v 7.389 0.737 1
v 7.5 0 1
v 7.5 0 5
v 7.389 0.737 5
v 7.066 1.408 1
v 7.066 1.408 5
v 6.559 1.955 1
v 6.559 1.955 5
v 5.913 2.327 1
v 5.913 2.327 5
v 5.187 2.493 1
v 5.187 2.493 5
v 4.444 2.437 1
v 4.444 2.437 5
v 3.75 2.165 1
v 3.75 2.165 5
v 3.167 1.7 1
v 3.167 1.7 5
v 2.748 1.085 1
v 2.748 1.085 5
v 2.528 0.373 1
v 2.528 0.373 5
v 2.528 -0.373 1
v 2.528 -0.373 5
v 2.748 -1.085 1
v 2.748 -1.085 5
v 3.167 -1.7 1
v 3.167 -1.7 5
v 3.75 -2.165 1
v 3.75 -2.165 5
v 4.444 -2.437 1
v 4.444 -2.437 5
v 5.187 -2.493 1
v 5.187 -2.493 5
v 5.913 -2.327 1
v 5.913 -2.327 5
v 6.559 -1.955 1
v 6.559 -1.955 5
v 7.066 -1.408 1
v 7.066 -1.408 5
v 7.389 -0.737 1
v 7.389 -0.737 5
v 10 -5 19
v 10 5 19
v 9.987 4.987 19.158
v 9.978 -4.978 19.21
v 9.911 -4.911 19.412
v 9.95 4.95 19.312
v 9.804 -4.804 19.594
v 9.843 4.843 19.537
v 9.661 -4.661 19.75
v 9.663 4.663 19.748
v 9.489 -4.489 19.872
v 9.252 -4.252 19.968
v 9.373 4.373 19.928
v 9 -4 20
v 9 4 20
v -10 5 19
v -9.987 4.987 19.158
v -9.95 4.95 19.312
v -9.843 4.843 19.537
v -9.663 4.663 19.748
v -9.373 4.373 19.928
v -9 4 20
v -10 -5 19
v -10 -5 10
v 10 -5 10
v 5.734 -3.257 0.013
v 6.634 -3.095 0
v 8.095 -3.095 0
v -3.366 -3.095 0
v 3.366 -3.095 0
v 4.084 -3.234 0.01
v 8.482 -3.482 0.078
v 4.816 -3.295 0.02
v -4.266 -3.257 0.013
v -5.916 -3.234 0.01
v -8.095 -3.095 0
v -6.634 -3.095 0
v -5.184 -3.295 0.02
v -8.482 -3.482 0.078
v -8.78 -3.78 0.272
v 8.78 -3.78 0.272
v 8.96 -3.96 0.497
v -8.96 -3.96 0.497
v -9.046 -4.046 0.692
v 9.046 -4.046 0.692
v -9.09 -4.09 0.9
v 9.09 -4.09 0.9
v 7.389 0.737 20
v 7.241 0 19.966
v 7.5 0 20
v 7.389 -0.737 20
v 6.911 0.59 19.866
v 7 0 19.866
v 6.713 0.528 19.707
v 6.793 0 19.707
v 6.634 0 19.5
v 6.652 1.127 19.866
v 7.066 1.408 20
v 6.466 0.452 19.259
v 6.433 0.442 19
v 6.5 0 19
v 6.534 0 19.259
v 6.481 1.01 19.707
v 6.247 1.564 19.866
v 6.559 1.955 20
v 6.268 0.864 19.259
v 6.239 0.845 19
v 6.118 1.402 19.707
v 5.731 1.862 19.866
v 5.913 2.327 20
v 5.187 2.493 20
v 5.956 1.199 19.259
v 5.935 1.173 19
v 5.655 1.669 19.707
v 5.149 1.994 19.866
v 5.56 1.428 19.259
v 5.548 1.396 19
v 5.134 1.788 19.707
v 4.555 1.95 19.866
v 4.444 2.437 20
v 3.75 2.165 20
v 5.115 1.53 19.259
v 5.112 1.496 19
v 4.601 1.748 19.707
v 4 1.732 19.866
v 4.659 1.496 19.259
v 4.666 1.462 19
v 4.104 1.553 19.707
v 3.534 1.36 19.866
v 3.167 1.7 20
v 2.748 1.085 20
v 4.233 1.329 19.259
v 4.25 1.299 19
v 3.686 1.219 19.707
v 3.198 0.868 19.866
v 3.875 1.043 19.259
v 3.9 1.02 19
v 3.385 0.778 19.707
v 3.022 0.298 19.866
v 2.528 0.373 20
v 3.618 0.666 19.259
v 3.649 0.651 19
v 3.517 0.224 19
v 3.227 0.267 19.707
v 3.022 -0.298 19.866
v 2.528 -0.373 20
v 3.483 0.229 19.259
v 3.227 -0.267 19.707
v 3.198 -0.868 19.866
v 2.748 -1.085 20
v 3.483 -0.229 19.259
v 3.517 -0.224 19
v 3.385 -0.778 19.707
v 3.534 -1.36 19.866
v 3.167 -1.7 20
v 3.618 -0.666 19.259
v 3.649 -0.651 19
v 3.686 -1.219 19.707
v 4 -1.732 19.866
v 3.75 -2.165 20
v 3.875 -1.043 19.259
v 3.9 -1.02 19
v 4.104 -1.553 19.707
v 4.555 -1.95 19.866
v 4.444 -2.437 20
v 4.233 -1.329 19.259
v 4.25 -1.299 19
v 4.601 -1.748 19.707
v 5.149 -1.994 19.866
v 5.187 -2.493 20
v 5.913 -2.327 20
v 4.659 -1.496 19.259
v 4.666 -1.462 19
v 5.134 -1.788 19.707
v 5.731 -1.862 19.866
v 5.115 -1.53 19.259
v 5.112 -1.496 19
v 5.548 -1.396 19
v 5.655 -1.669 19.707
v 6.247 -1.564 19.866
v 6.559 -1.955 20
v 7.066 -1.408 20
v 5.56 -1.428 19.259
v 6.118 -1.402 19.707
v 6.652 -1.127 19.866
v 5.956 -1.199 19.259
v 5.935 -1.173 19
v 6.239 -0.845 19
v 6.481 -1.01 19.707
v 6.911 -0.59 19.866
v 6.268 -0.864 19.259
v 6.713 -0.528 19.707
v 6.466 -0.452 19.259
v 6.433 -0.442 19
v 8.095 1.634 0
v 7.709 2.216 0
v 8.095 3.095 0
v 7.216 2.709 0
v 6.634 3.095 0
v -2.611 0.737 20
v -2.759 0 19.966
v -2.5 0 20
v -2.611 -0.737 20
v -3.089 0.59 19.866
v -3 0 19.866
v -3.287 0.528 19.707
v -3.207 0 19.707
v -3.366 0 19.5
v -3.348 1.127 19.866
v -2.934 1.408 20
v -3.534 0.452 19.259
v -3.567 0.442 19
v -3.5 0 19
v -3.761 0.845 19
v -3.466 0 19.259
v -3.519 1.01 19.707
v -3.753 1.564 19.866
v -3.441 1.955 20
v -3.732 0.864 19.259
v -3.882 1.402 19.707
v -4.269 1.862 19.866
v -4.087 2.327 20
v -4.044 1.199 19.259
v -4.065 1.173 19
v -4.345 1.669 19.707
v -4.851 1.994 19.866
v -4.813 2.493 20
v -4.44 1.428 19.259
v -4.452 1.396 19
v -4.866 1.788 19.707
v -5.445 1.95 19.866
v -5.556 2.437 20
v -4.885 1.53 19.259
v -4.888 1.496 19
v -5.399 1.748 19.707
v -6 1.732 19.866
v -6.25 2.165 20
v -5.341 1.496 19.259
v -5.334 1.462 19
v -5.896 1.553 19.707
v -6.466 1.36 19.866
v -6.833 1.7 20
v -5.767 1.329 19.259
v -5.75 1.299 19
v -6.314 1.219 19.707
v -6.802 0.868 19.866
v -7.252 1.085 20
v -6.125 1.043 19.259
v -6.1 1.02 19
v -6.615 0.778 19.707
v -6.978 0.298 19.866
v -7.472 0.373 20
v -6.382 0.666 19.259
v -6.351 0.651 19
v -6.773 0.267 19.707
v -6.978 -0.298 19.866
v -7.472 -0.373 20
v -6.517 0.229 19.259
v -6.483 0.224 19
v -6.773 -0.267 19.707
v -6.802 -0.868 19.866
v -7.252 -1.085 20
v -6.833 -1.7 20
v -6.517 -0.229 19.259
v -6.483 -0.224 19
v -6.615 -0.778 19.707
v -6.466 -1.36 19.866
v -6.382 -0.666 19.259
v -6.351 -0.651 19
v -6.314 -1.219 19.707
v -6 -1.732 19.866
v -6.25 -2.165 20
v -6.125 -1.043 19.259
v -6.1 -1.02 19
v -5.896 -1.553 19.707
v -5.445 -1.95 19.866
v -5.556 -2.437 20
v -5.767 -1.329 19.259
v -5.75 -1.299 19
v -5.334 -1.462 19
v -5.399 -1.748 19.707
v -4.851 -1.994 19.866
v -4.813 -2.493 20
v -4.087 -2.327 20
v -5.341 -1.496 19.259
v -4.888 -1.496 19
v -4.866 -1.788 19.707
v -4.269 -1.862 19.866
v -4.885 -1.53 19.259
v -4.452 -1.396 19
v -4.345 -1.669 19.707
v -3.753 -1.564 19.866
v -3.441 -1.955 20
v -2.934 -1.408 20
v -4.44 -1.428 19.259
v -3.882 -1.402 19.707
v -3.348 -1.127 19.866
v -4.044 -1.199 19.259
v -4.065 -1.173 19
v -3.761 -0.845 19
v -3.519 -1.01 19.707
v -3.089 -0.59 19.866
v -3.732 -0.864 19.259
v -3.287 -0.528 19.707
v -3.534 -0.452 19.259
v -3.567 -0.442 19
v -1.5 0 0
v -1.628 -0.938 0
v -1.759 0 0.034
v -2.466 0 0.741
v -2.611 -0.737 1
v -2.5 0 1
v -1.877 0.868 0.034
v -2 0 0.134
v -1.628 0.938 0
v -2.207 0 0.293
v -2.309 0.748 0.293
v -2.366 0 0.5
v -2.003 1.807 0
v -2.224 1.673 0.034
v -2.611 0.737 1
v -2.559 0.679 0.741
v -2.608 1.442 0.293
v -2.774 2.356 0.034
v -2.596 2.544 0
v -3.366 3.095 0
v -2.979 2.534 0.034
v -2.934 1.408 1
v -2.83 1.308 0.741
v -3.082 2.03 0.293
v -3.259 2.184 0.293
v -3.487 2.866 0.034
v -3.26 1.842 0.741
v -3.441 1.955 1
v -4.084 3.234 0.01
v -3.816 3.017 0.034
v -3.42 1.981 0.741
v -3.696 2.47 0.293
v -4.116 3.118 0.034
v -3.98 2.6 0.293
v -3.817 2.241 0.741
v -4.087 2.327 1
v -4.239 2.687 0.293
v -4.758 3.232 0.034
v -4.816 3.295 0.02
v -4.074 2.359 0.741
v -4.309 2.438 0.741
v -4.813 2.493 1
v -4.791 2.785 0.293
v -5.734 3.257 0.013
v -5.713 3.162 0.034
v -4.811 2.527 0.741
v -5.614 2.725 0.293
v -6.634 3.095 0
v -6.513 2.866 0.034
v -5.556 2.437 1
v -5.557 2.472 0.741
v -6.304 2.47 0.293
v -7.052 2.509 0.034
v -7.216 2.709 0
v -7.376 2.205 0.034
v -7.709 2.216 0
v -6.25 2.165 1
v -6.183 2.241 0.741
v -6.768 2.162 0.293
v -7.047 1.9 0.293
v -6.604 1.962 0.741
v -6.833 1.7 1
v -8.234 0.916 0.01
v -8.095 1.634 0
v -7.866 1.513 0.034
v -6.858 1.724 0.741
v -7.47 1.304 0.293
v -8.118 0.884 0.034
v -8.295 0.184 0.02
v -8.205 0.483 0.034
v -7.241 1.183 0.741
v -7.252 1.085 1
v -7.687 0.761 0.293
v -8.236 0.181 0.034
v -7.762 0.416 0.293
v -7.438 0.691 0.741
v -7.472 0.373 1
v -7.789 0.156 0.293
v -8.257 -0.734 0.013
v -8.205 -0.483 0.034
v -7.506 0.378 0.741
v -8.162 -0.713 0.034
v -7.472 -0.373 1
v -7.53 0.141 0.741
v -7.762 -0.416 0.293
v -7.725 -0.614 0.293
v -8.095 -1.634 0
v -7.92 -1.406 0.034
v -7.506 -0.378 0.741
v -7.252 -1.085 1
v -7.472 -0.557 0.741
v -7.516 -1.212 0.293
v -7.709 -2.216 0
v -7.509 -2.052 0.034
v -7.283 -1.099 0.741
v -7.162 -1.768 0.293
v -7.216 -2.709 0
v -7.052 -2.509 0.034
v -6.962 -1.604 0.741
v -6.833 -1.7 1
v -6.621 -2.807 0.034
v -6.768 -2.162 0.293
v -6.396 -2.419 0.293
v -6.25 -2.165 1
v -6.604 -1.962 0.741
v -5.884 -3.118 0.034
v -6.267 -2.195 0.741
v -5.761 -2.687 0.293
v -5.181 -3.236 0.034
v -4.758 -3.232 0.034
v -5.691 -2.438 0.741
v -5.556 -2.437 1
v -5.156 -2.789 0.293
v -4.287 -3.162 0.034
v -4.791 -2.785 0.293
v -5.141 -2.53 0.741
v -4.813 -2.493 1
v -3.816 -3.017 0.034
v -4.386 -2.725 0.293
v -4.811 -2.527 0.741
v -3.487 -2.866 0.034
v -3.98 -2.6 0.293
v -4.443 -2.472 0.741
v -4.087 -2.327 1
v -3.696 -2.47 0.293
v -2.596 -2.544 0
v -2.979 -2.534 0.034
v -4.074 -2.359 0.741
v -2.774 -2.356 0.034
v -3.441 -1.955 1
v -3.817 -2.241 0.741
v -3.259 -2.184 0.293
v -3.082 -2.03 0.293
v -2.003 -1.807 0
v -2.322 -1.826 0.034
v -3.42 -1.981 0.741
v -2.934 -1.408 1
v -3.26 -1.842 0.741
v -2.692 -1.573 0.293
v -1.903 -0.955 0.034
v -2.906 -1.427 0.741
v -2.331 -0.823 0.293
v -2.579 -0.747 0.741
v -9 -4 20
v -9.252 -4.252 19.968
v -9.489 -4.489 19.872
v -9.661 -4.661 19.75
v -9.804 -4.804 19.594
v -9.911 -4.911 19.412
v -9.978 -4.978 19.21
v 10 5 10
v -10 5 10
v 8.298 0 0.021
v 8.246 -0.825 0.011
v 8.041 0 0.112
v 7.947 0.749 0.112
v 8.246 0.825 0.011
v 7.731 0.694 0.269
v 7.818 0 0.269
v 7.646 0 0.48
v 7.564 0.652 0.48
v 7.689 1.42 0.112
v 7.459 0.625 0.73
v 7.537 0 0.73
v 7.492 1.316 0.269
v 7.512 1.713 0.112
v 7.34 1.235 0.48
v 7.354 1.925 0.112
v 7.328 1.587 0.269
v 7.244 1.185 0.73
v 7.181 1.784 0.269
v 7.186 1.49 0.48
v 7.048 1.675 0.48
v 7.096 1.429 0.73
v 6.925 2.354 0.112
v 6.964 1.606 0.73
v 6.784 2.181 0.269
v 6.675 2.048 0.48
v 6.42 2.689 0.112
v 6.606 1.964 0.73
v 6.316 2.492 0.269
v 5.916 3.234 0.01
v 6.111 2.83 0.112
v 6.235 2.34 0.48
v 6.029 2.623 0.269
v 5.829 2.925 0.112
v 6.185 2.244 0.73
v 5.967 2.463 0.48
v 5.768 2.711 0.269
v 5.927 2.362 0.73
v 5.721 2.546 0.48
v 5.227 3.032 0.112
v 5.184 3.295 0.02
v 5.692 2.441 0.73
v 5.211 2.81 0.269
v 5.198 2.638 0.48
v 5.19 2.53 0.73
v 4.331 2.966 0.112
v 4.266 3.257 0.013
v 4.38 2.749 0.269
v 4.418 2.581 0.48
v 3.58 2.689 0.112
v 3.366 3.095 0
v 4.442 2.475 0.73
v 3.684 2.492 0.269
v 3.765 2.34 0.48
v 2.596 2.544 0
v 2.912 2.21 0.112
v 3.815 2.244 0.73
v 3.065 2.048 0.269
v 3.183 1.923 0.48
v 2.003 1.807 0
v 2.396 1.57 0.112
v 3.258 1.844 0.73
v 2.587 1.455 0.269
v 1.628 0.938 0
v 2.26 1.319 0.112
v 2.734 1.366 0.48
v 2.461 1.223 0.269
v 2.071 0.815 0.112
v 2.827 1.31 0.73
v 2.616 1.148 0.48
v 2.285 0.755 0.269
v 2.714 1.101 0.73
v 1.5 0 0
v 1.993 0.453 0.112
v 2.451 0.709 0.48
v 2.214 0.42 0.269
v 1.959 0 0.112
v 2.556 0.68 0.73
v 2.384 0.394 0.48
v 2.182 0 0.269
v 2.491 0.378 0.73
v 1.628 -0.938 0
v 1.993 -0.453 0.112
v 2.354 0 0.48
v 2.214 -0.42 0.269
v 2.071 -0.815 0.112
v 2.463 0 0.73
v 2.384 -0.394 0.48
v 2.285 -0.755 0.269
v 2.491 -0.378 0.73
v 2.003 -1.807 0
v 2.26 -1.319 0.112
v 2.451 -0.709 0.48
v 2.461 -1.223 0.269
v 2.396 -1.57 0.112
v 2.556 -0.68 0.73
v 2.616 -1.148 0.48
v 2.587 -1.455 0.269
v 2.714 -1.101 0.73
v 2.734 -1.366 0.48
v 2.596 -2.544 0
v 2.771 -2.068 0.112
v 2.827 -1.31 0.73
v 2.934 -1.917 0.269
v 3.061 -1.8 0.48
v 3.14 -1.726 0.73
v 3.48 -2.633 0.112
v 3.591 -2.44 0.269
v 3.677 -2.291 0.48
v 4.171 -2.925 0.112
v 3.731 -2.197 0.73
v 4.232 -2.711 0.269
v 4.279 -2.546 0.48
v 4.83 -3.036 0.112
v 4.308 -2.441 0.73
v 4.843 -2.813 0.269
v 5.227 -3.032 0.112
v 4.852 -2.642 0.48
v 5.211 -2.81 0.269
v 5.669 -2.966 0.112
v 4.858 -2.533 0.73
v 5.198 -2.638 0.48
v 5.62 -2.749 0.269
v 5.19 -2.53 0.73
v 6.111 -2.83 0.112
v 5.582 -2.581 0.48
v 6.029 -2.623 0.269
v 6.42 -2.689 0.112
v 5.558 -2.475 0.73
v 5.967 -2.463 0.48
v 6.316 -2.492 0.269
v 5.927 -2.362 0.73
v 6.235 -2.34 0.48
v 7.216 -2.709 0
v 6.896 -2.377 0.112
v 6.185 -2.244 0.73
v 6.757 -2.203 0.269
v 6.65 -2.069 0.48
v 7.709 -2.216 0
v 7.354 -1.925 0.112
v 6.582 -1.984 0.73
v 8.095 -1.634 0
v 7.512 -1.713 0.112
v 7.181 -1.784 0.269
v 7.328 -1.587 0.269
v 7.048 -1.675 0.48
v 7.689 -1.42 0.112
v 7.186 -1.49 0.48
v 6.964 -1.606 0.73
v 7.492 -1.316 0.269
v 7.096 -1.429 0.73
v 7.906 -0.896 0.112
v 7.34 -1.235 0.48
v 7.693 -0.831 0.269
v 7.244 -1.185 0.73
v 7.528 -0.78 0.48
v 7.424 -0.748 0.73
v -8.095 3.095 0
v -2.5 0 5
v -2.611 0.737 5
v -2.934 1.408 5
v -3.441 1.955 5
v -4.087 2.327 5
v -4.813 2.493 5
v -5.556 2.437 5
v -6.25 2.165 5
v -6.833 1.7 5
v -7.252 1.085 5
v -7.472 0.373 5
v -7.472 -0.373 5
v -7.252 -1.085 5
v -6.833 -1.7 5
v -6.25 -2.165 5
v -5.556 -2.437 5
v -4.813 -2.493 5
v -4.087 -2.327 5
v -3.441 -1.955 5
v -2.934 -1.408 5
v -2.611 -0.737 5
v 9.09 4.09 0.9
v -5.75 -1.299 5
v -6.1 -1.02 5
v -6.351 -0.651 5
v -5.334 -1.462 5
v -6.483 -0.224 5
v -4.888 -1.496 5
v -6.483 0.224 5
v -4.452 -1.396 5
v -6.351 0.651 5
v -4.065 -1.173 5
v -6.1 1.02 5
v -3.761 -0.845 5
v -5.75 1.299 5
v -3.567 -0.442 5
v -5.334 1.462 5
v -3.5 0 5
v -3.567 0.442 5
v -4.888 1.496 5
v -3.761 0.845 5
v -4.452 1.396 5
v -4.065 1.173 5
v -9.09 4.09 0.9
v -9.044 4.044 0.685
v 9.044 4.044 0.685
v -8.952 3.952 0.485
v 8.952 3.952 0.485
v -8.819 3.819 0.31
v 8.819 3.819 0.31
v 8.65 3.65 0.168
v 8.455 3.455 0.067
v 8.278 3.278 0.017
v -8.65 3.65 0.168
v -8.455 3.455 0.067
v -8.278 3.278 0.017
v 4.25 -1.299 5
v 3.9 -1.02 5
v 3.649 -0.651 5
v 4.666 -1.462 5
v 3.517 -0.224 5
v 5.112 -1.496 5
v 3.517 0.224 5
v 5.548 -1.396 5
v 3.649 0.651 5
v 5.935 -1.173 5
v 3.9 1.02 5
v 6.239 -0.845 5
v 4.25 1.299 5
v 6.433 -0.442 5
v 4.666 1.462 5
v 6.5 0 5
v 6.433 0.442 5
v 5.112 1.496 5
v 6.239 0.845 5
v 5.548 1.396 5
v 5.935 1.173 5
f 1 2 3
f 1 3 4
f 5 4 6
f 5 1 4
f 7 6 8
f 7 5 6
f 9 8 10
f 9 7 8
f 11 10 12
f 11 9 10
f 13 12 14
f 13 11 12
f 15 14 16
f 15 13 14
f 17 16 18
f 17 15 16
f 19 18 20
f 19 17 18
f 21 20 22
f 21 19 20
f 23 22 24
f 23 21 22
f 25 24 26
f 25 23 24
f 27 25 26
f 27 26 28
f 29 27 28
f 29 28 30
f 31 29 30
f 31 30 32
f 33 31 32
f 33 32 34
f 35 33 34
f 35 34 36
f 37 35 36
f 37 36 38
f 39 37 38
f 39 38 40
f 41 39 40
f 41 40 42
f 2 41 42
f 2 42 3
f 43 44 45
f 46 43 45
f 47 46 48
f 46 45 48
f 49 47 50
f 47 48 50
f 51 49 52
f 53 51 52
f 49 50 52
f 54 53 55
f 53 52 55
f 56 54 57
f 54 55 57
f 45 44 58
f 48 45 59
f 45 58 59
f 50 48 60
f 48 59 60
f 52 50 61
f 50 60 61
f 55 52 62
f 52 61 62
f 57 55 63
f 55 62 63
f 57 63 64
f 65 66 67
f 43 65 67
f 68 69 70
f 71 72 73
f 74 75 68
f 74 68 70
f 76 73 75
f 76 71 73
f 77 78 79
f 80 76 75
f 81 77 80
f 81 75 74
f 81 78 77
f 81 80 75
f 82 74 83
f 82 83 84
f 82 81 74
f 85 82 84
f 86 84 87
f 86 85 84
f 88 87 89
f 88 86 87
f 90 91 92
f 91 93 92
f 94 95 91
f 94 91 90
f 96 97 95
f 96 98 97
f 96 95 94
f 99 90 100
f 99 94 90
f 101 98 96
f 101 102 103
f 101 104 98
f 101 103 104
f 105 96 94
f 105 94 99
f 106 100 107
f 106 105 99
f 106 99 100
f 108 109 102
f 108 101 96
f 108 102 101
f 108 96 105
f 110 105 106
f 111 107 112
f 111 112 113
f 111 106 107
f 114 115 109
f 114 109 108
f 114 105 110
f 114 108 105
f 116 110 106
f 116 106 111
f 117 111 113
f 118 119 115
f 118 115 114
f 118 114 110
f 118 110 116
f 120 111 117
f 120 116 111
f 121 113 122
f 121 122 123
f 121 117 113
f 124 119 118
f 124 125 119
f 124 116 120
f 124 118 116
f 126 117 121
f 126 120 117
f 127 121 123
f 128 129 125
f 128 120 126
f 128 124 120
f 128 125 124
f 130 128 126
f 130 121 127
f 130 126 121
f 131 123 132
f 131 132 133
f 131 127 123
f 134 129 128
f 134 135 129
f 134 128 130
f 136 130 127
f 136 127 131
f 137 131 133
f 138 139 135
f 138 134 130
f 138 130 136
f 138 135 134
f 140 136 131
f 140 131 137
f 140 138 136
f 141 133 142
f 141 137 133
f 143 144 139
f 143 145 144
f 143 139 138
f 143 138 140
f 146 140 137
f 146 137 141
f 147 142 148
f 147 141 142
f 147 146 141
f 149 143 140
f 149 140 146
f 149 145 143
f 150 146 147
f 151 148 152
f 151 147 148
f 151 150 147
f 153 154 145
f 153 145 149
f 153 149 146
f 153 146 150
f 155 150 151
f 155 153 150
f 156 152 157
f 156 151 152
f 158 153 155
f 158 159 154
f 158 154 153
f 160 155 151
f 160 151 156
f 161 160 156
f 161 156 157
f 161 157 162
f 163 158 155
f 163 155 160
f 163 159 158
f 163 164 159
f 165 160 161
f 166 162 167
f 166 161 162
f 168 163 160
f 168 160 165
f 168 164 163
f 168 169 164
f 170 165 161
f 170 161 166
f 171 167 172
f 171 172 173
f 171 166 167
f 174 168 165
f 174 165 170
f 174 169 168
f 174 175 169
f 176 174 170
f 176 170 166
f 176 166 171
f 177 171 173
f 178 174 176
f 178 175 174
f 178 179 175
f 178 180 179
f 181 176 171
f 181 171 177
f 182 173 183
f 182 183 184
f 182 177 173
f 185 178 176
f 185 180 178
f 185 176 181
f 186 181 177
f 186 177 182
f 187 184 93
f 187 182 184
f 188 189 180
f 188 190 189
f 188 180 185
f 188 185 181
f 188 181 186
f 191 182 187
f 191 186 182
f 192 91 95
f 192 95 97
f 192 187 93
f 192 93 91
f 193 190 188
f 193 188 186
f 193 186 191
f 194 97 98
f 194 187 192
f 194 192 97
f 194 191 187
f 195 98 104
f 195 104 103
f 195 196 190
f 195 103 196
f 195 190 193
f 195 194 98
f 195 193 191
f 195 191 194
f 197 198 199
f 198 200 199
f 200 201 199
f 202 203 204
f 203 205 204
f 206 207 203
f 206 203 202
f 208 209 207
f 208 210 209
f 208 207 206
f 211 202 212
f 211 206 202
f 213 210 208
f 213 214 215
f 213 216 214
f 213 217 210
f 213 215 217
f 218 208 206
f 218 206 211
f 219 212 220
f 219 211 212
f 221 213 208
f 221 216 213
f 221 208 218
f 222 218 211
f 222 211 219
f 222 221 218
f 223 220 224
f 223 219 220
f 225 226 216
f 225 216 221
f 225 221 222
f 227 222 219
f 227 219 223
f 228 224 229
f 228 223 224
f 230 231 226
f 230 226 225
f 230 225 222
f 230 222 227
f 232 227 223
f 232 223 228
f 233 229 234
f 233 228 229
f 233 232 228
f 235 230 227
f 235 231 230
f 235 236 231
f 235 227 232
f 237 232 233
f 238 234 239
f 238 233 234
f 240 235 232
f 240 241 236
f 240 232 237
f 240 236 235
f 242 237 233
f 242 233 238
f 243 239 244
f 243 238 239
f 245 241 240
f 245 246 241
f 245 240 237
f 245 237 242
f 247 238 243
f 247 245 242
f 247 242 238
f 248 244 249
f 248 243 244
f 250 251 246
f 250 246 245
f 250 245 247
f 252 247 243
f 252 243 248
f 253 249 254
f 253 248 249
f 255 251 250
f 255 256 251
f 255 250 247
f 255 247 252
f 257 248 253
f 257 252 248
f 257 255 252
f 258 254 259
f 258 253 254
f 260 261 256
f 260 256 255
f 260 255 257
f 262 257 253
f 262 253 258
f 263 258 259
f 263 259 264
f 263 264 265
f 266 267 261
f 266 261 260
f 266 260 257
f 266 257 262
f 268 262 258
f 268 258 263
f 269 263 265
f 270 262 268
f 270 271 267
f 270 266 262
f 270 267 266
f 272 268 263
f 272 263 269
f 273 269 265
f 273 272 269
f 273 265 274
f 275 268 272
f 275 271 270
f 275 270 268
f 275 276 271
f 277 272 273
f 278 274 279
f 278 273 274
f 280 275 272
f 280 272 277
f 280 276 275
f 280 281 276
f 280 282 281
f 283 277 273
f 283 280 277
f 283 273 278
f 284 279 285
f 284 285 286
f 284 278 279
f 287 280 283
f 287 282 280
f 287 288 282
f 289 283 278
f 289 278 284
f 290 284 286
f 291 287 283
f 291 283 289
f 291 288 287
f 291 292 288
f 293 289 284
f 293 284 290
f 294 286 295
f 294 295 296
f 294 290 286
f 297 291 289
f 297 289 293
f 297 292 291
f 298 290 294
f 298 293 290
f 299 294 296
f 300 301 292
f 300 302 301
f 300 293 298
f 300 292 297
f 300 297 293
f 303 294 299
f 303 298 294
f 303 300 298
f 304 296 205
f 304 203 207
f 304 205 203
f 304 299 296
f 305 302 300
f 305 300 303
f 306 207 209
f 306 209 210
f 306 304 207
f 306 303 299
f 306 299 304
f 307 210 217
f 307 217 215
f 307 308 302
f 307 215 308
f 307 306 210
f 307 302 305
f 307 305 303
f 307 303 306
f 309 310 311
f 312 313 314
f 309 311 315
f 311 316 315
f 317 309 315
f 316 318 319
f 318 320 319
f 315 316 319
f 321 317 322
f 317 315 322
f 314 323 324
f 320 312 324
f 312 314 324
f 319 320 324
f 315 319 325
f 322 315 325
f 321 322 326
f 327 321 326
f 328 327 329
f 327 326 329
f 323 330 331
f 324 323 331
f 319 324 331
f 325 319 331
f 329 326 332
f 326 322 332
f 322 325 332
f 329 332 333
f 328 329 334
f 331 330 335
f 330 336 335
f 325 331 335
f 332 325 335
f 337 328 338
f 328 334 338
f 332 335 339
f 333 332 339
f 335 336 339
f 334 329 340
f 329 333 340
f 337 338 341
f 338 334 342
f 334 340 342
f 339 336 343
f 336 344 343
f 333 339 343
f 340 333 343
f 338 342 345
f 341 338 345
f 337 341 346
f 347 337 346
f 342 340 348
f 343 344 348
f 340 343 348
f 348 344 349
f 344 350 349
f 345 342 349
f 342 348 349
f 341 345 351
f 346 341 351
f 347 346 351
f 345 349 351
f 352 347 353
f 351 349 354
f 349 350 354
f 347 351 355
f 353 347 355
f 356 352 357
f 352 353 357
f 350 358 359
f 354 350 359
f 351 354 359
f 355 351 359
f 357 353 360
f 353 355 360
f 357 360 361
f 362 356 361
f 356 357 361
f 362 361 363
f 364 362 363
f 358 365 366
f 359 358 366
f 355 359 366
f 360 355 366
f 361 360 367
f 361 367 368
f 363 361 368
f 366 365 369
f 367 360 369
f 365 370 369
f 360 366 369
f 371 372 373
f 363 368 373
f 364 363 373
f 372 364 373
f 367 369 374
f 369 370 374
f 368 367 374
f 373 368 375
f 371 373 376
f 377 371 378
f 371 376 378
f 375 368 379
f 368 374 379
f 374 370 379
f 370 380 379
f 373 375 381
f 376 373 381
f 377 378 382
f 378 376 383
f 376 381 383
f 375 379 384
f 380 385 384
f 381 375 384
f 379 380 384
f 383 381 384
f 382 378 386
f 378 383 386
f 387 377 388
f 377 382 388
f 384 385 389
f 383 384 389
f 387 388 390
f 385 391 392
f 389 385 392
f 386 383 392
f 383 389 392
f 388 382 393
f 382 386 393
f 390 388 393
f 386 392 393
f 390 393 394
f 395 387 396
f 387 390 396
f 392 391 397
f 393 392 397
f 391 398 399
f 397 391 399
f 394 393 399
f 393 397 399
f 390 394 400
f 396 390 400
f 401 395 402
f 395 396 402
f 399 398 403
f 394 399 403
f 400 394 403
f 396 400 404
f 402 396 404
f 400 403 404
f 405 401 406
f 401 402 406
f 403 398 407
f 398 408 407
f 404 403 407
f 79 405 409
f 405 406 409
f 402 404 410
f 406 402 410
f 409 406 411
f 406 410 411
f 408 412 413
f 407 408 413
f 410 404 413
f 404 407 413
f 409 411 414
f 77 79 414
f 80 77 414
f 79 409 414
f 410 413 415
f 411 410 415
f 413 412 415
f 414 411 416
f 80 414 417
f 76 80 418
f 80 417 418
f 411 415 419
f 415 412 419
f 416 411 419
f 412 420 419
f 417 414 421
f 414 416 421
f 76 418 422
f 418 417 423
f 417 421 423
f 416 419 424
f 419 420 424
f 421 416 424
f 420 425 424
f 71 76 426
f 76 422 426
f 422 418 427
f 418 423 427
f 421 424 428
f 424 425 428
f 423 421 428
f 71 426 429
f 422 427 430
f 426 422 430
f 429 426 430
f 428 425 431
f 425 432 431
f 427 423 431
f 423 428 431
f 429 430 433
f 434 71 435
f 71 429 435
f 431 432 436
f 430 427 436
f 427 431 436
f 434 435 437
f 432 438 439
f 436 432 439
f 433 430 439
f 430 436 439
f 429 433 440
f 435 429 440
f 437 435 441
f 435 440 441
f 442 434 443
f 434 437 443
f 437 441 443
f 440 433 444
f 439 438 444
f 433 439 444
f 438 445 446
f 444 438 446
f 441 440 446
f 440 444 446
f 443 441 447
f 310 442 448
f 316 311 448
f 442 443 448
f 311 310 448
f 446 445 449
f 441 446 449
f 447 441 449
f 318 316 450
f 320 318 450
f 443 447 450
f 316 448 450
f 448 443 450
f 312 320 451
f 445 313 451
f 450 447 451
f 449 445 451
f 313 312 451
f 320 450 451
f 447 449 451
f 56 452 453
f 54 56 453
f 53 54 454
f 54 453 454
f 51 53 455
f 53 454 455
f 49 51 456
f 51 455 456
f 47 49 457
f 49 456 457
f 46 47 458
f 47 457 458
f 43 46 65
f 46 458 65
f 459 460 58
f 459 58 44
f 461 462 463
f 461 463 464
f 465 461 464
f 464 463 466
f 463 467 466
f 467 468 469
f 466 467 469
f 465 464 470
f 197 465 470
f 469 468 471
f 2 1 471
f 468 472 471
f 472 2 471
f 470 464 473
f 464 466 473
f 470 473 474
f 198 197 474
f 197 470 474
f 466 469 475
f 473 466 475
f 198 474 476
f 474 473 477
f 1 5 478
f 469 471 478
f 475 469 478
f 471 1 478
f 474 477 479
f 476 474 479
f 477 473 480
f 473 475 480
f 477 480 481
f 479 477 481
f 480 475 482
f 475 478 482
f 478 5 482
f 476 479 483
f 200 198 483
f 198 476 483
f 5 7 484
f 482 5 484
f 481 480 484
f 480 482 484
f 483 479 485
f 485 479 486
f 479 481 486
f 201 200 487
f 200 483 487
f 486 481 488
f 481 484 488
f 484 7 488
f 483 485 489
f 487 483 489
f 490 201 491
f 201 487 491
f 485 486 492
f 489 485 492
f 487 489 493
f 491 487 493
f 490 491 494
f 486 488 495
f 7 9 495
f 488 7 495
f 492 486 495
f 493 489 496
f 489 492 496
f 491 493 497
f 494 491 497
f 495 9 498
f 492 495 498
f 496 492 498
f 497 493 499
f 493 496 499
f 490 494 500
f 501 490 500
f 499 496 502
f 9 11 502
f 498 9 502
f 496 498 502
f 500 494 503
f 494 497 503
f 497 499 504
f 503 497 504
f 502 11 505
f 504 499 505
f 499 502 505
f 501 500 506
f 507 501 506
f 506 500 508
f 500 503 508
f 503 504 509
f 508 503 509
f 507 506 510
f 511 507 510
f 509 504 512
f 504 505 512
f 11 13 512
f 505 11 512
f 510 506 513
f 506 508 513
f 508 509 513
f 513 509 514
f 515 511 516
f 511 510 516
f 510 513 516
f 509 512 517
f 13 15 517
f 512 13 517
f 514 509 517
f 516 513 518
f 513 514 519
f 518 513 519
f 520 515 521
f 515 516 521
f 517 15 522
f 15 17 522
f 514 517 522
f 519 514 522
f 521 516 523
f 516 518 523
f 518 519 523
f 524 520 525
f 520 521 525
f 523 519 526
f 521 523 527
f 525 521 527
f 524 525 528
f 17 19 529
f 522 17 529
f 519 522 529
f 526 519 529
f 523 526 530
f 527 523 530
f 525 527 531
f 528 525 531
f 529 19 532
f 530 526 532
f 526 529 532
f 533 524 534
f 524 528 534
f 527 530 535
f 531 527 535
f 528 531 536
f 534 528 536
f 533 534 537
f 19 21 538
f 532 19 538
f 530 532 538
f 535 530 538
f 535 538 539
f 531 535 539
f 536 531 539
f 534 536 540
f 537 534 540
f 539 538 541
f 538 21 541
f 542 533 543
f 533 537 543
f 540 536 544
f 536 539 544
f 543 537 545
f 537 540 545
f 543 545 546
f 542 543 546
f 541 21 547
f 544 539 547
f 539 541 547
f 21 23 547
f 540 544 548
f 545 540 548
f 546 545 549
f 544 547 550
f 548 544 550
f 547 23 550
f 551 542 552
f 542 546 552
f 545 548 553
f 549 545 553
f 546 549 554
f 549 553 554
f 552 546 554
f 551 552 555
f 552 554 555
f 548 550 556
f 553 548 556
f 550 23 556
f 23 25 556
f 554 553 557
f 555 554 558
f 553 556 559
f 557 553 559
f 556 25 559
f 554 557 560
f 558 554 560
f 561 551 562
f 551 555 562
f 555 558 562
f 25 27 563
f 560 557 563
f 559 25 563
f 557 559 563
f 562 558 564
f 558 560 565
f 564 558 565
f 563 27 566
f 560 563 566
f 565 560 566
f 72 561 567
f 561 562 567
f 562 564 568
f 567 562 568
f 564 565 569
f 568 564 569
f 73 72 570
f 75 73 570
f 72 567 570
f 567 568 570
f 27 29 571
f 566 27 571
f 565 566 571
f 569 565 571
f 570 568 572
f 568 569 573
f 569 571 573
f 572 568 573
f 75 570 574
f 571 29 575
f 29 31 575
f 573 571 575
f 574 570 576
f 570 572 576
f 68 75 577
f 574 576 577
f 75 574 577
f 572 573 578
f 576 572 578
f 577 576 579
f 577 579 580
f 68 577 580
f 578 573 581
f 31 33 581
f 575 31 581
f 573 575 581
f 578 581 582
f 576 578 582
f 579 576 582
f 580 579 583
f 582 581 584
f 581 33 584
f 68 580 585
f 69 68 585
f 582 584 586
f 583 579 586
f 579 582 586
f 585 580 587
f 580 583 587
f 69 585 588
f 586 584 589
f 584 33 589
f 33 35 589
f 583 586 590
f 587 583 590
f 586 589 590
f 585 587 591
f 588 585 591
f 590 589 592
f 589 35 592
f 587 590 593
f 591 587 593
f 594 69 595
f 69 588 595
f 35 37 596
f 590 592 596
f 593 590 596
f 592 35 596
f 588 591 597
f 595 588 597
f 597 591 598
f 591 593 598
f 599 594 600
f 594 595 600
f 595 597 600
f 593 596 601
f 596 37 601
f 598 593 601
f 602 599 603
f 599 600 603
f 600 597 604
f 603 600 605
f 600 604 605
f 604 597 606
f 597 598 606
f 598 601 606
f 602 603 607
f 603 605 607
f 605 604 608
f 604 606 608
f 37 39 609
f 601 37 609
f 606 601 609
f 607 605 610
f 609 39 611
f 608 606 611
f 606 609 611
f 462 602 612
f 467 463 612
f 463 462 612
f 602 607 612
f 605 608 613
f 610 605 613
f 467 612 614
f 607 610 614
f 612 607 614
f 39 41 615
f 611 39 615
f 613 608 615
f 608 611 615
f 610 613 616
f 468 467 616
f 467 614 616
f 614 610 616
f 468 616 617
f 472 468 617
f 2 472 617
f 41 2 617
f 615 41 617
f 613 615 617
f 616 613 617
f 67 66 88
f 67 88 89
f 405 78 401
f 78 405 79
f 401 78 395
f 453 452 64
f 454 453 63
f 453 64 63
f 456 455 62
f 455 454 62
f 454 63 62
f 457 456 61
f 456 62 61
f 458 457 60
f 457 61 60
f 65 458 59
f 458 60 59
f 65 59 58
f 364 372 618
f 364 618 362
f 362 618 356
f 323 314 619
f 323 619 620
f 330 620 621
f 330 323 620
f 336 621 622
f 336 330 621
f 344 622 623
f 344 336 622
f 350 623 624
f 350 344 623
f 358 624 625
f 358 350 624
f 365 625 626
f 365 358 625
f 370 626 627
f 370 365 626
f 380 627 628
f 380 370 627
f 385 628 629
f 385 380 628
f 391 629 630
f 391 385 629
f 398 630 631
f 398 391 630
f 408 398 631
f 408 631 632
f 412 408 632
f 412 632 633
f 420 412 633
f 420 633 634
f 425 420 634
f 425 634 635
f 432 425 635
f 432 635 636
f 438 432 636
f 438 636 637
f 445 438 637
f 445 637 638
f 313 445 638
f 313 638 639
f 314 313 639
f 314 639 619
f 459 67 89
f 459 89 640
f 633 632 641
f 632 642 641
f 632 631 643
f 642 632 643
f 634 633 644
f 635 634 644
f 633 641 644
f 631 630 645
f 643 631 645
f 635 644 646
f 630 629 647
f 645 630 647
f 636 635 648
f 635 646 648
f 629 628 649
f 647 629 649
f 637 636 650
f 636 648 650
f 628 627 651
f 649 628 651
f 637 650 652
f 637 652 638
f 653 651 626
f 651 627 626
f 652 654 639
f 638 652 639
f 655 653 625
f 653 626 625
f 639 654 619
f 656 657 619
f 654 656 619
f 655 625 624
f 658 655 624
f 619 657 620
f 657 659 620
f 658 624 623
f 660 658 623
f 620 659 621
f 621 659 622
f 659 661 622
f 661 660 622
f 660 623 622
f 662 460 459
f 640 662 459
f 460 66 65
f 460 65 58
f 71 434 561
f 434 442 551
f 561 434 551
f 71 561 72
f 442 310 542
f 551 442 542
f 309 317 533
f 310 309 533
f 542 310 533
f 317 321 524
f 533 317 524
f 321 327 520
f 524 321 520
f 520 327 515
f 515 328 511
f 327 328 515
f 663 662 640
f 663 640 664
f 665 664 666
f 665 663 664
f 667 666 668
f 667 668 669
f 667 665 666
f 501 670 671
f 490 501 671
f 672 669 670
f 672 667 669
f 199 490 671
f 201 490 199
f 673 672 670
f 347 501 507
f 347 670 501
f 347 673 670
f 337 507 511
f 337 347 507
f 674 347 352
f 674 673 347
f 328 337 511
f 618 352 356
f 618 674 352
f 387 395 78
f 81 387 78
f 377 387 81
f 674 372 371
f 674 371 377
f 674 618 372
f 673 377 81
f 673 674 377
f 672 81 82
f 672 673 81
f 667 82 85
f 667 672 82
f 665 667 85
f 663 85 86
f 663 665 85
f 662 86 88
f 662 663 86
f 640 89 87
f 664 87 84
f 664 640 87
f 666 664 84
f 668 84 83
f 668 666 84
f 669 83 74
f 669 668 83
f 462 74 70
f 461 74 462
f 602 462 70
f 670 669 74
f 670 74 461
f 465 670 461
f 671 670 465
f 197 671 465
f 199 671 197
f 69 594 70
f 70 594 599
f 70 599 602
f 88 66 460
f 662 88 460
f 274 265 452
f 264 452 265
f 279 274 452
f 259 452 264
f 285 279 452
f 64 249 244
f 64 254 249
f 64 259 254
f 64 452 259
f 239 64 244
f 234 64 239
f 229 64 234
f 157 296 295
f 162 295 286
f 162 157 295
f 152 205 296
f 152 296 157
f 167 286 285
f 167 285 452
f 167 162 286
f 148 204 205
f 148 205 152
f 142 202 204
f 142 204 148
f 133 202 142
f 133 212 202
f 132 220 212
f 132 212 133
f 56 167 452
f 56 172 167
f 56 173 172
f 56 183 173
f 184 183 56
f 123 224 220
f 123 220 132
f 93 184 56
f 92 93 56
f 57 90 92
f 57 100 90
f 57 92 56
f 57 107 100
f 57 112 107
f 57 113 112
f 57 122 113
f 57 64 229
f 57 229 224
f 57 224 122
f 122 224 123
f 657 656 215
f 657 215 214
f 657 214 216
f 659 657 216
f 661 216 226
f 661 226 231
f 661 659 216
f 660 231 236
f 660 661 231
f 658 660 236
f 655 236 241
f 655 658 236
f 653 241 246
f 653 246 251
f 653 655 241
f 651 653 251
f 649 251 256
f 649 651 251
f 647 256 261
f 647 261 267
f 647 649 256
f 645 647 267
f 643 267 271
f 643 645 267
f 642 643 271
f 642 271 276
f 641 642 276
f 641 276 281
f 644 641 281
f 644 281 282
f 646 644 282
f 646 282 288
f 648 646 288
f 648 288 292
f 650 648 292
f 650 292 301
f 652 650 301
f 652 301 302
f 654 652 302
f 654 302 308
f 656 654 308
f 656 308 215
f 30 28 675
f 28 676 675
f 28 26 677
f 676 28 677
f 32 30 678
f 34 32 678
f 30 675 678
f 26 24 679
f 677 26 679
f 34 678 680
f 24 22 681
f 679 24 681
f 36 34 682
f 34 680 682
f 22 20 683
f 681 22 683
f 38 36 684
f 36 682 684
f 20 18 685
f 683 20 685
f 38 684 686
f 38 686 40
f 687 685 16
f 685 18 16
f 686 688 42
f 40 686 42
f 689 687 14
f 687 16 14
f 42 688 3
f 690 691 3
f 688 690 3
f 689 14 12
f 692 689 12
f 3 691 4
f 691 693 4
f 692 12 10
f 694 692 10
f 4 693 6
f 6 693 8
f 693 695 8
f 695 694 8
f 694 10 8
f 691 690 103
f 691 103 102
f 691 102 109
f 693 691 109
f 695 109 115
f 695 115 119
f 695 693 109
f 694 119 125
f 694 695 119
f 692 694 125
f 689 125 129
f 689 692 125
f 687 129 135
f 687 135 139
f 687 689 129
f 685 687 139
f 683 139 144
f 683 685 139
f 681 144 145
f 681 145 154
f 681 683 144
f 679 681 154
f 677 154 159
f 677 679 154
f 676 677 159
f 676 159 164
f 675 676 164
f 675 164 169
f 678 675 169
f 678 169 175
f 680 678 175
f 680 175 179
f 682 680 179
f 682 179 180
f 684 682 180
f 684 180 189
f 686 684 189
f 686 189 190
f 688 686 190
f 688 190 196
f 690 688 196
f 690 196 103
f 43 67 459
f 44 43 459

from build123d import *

# Parameters (mm, degrees)
F0_W        = 20
F0_H        = 10
F0_W_2      = 17.7
F0_H_2      = 7.5
F0_R        = 2.5
F0_R_2      = 1.5
F1_DEPTH    = 20
F2_DEPTH    = 5
F3_SIZE2    = 10
F3_SIZE     = 1
F4_T1_DEPTH = 22.5249378106
F4_T3_DEPTH = 12.5249378106
F4_T5_DEPTH = 25
F4_T7_DEPTH = 15


# Not quite as in the source:
# - a fillet or chamfer that OpenCascade refuses, or shapes differently, is made with other operations: its cross-section is extruded or revolved along the edge and cut away or added


with BuildPart() as f1:
    # F0 (on Top) → F1 (new body)
    with BuildSketch(Plane.XY):
        Rectangle(F0_W, F0_H)
        Rectangle(F0_W_2, F0_H_2, mode=Mode.SUBTRACT)
        Rectangle(F0_W_2, F0_H_2)
        with Locations((-5, 0)):
            Circle(F0_R, mode=Mode.SUBTRACT)
        with Locations((5, 0)):
            Circle(F0_R, mode=Mode.SUBTRACT)
        with Locations((5, 0)):
            Circle(F0_R)
        with Locations((5, 0)):
            Circle(F0_R_2, mode=Mode.SUBTRACT)
        with Locations((-5, 0)):
            Circle(F0_R)
        with Locations((-5, 0)):
            Circle(F0_R_2, mode=Mode.SUBTRACT)
    extrude(amount=F1_DEPTH)

    # F0 (on Top) → F2 (cut)
    with BuildSketch(Plane.XY):
        with Locations((-5, 0)):
            Circle(F0_R)
        with Locations((-5, 0)):
            Circle(F0_R_2, mode=Mode.SUBTRACT)
        with Locations((5, 0)):
            Circle(F0_R)
        with Locations((5, 0)):
            Circle(F0_R_2, mode=Mode.SUBTRACT)
    extrude(amount=F2_DEPTH, mode=Mode.SUBTRACT)

    # F3
    f3_edges = [f1.edges().sort_by_distance(p)[0] for p in [
        (0, -5, 0),
        (-10, 0, 0),
        (0, 5, 0),
        (10, 0, 0),
    ]]
    f3_side = f1.faces().sort_by_distance((0, 0, 0))[0]
    chamfer(f3_edges, length=F3_SIZE, length2=F3_SIZE2, reference=f3_side)

    # F4: fillet of radius 1 on 12 edges, made by hand

    # F4_s2 → F4_t1 (cut)
    with BuildSketch(Plane.YZ.offset(-11.2624689053)):
        with BuildLine():
            ThreePointArc((-3.0950124379, 0), (-3.7660177586, 0.2585474664), (-4.0900496281, 0.900496281))
            Line((-4.0900496281, 0.900496281), (-4, 0))
            Line((-4, 0), (-3.0950124379, 0))
        make_face()
        with BuildLine():
            ThreePointArc((4.0900496281, 0.900496281), (3.7660177586, 0.2585474664), (3.0950124379, 0))
            Line((3.0950124379, 0), (4, 0))
            Line((4, 0), (4.0900496281, 0.900496281))
        make_face()
    extrude(amount=F4_T1_DEPTH, mode=Mode.SUBTRACT)

    # F4_s4 → F4_t3 (cut)
    with BuildSketch(Plane.XZ.offset(-6.2624689053)):
        with BuildLine():
            ThreePointArc((-8.0950124379, 0), (-8.7660177586, 0.2585474664), (-9.0900496281, 0.900496281))
            Line((-9.0900496281, 0.900496281), (-9, 0))
            Line((-9, 0), (-8.0950124379, 0))
        make_face()
        with BuildLine():
            ThreePointArc((9.0900496281, 0.900496281), (8.7660177586, 0.2585474664), (8.0950124379, 0))
            Line((8.0950124379, 0), (9, 0))
            Line((9, 0), (9.0900496281, 0.900496281))
        make_face()
    extrude(amount=F4_T3_DEPTH, mode=Mode.SUBTRACT)

    # F4_s6 → F4_t5 (cut)
    with BuildSketch(Plane.YZ.offset(-12.5)):
        with BuildLine():
            ThreePointArc((-4, 20), (-4.7071067812, 19.7071067812), (-5, 19))
            Line((-5, 19), (-5, 20))
            Line((-5, 20), (-4, 20))
        make_face()
        with BuildLine():
            ThreePointArc((5, 19), (4.7071067812, 19.7071067812), (4, 20))
            Line((4, 20), (5, 20))
            Line((5, 20), (5, 19))
        make_face()
    extrude(amount=F4_T5_DEPTH, mode=Mode.SUBTRACT)

    # F4_s8 → F4_t7 (cut)
    with BuildSketch(Plane.XZ.offset(-7.5)):
        with BuildLine():
            ThreePointArc((10, 19), (9.7071067812, 19.7071067812), (9, 20))
            Line((9, 20), (10, 20))
            Line((10, 20), (10, 19))
        make_face()
        with BuildLine():
            ThreePointArc((-9, 20), (-9.7071067812, 19.7071067812), (-10, 19))
            Line((-10, 19), (-10, 20))
            Line((-10, 20), (-9, 20))
        make_face()
    extrude(amount=F4_T7_DEPTH, mode=Mode.SUBTRACT)

    # F4_s9 → F4_t10 (revolve, cut)
    with BuildSketch(Plane.XZ):
        with BuildLine():
            ThreePointArc((7.5, 20), (6.7928932188, 19.7071067812), (6.5, 19))
            Line((6.5, 19), (6.5, 20))
            Line((6.5, 20), (7.5, 20))
        make_face()
    revolve(axis=Axis((5, 0, 20), (0, 0, 1)), mode=Mode.SUBTRACT)

    # F4_s11 → F4_t12 (revolve, cut)
    with BuildSketch(Plane.XZ):
        with BuildLine():
            ThreePointArc((-2.5, 20), (-3.2071067812, 19.7071067812), (-3.5, 19))
            Line((-3.5, 19), (-3.5, 20))
            Line((-3.5, 20), (-2.5, 20))
        make_face()
    revolve(axis=Axis((-5, 0, 20), (0, 0, 1)), mode=Mode.SUBTRACT)

    # F4_s13 → F4_t14 (revolve, cut)
    with BuildSketch(Plane.XZ):
        with BuildLine():
            ThreePointArc((8.5, 0), (7.7928932188, 0.2928932188), (7.5, 1))
            Line((7.5, 1), (7.5, 0))
            Line((7.5, 0), (8.5, 0))
        make_face()
    revolve(axis=Axis((5, 0, 0), (0, 0, 1)), mode=Mode.SUBTRACT)

    # F4_s15 → F4_t16 (revolve, cut)
    with BuildSketch(Plane.XZ):
        with BuildLine():
            ThreePointArc((-1.5, 0), (-2.2071067812, 0.2928932188), (-2.5, 1))
            Line((-2.5, 1), (-2.5, 0))
            Line((-2.5, 0), (-1.5, 0))
        make_face()
    revolve(axis=Axis((-5, 0, 0), (0, 0, 1)), mode=Mode.SUBTRACT)


solid = f1.part
